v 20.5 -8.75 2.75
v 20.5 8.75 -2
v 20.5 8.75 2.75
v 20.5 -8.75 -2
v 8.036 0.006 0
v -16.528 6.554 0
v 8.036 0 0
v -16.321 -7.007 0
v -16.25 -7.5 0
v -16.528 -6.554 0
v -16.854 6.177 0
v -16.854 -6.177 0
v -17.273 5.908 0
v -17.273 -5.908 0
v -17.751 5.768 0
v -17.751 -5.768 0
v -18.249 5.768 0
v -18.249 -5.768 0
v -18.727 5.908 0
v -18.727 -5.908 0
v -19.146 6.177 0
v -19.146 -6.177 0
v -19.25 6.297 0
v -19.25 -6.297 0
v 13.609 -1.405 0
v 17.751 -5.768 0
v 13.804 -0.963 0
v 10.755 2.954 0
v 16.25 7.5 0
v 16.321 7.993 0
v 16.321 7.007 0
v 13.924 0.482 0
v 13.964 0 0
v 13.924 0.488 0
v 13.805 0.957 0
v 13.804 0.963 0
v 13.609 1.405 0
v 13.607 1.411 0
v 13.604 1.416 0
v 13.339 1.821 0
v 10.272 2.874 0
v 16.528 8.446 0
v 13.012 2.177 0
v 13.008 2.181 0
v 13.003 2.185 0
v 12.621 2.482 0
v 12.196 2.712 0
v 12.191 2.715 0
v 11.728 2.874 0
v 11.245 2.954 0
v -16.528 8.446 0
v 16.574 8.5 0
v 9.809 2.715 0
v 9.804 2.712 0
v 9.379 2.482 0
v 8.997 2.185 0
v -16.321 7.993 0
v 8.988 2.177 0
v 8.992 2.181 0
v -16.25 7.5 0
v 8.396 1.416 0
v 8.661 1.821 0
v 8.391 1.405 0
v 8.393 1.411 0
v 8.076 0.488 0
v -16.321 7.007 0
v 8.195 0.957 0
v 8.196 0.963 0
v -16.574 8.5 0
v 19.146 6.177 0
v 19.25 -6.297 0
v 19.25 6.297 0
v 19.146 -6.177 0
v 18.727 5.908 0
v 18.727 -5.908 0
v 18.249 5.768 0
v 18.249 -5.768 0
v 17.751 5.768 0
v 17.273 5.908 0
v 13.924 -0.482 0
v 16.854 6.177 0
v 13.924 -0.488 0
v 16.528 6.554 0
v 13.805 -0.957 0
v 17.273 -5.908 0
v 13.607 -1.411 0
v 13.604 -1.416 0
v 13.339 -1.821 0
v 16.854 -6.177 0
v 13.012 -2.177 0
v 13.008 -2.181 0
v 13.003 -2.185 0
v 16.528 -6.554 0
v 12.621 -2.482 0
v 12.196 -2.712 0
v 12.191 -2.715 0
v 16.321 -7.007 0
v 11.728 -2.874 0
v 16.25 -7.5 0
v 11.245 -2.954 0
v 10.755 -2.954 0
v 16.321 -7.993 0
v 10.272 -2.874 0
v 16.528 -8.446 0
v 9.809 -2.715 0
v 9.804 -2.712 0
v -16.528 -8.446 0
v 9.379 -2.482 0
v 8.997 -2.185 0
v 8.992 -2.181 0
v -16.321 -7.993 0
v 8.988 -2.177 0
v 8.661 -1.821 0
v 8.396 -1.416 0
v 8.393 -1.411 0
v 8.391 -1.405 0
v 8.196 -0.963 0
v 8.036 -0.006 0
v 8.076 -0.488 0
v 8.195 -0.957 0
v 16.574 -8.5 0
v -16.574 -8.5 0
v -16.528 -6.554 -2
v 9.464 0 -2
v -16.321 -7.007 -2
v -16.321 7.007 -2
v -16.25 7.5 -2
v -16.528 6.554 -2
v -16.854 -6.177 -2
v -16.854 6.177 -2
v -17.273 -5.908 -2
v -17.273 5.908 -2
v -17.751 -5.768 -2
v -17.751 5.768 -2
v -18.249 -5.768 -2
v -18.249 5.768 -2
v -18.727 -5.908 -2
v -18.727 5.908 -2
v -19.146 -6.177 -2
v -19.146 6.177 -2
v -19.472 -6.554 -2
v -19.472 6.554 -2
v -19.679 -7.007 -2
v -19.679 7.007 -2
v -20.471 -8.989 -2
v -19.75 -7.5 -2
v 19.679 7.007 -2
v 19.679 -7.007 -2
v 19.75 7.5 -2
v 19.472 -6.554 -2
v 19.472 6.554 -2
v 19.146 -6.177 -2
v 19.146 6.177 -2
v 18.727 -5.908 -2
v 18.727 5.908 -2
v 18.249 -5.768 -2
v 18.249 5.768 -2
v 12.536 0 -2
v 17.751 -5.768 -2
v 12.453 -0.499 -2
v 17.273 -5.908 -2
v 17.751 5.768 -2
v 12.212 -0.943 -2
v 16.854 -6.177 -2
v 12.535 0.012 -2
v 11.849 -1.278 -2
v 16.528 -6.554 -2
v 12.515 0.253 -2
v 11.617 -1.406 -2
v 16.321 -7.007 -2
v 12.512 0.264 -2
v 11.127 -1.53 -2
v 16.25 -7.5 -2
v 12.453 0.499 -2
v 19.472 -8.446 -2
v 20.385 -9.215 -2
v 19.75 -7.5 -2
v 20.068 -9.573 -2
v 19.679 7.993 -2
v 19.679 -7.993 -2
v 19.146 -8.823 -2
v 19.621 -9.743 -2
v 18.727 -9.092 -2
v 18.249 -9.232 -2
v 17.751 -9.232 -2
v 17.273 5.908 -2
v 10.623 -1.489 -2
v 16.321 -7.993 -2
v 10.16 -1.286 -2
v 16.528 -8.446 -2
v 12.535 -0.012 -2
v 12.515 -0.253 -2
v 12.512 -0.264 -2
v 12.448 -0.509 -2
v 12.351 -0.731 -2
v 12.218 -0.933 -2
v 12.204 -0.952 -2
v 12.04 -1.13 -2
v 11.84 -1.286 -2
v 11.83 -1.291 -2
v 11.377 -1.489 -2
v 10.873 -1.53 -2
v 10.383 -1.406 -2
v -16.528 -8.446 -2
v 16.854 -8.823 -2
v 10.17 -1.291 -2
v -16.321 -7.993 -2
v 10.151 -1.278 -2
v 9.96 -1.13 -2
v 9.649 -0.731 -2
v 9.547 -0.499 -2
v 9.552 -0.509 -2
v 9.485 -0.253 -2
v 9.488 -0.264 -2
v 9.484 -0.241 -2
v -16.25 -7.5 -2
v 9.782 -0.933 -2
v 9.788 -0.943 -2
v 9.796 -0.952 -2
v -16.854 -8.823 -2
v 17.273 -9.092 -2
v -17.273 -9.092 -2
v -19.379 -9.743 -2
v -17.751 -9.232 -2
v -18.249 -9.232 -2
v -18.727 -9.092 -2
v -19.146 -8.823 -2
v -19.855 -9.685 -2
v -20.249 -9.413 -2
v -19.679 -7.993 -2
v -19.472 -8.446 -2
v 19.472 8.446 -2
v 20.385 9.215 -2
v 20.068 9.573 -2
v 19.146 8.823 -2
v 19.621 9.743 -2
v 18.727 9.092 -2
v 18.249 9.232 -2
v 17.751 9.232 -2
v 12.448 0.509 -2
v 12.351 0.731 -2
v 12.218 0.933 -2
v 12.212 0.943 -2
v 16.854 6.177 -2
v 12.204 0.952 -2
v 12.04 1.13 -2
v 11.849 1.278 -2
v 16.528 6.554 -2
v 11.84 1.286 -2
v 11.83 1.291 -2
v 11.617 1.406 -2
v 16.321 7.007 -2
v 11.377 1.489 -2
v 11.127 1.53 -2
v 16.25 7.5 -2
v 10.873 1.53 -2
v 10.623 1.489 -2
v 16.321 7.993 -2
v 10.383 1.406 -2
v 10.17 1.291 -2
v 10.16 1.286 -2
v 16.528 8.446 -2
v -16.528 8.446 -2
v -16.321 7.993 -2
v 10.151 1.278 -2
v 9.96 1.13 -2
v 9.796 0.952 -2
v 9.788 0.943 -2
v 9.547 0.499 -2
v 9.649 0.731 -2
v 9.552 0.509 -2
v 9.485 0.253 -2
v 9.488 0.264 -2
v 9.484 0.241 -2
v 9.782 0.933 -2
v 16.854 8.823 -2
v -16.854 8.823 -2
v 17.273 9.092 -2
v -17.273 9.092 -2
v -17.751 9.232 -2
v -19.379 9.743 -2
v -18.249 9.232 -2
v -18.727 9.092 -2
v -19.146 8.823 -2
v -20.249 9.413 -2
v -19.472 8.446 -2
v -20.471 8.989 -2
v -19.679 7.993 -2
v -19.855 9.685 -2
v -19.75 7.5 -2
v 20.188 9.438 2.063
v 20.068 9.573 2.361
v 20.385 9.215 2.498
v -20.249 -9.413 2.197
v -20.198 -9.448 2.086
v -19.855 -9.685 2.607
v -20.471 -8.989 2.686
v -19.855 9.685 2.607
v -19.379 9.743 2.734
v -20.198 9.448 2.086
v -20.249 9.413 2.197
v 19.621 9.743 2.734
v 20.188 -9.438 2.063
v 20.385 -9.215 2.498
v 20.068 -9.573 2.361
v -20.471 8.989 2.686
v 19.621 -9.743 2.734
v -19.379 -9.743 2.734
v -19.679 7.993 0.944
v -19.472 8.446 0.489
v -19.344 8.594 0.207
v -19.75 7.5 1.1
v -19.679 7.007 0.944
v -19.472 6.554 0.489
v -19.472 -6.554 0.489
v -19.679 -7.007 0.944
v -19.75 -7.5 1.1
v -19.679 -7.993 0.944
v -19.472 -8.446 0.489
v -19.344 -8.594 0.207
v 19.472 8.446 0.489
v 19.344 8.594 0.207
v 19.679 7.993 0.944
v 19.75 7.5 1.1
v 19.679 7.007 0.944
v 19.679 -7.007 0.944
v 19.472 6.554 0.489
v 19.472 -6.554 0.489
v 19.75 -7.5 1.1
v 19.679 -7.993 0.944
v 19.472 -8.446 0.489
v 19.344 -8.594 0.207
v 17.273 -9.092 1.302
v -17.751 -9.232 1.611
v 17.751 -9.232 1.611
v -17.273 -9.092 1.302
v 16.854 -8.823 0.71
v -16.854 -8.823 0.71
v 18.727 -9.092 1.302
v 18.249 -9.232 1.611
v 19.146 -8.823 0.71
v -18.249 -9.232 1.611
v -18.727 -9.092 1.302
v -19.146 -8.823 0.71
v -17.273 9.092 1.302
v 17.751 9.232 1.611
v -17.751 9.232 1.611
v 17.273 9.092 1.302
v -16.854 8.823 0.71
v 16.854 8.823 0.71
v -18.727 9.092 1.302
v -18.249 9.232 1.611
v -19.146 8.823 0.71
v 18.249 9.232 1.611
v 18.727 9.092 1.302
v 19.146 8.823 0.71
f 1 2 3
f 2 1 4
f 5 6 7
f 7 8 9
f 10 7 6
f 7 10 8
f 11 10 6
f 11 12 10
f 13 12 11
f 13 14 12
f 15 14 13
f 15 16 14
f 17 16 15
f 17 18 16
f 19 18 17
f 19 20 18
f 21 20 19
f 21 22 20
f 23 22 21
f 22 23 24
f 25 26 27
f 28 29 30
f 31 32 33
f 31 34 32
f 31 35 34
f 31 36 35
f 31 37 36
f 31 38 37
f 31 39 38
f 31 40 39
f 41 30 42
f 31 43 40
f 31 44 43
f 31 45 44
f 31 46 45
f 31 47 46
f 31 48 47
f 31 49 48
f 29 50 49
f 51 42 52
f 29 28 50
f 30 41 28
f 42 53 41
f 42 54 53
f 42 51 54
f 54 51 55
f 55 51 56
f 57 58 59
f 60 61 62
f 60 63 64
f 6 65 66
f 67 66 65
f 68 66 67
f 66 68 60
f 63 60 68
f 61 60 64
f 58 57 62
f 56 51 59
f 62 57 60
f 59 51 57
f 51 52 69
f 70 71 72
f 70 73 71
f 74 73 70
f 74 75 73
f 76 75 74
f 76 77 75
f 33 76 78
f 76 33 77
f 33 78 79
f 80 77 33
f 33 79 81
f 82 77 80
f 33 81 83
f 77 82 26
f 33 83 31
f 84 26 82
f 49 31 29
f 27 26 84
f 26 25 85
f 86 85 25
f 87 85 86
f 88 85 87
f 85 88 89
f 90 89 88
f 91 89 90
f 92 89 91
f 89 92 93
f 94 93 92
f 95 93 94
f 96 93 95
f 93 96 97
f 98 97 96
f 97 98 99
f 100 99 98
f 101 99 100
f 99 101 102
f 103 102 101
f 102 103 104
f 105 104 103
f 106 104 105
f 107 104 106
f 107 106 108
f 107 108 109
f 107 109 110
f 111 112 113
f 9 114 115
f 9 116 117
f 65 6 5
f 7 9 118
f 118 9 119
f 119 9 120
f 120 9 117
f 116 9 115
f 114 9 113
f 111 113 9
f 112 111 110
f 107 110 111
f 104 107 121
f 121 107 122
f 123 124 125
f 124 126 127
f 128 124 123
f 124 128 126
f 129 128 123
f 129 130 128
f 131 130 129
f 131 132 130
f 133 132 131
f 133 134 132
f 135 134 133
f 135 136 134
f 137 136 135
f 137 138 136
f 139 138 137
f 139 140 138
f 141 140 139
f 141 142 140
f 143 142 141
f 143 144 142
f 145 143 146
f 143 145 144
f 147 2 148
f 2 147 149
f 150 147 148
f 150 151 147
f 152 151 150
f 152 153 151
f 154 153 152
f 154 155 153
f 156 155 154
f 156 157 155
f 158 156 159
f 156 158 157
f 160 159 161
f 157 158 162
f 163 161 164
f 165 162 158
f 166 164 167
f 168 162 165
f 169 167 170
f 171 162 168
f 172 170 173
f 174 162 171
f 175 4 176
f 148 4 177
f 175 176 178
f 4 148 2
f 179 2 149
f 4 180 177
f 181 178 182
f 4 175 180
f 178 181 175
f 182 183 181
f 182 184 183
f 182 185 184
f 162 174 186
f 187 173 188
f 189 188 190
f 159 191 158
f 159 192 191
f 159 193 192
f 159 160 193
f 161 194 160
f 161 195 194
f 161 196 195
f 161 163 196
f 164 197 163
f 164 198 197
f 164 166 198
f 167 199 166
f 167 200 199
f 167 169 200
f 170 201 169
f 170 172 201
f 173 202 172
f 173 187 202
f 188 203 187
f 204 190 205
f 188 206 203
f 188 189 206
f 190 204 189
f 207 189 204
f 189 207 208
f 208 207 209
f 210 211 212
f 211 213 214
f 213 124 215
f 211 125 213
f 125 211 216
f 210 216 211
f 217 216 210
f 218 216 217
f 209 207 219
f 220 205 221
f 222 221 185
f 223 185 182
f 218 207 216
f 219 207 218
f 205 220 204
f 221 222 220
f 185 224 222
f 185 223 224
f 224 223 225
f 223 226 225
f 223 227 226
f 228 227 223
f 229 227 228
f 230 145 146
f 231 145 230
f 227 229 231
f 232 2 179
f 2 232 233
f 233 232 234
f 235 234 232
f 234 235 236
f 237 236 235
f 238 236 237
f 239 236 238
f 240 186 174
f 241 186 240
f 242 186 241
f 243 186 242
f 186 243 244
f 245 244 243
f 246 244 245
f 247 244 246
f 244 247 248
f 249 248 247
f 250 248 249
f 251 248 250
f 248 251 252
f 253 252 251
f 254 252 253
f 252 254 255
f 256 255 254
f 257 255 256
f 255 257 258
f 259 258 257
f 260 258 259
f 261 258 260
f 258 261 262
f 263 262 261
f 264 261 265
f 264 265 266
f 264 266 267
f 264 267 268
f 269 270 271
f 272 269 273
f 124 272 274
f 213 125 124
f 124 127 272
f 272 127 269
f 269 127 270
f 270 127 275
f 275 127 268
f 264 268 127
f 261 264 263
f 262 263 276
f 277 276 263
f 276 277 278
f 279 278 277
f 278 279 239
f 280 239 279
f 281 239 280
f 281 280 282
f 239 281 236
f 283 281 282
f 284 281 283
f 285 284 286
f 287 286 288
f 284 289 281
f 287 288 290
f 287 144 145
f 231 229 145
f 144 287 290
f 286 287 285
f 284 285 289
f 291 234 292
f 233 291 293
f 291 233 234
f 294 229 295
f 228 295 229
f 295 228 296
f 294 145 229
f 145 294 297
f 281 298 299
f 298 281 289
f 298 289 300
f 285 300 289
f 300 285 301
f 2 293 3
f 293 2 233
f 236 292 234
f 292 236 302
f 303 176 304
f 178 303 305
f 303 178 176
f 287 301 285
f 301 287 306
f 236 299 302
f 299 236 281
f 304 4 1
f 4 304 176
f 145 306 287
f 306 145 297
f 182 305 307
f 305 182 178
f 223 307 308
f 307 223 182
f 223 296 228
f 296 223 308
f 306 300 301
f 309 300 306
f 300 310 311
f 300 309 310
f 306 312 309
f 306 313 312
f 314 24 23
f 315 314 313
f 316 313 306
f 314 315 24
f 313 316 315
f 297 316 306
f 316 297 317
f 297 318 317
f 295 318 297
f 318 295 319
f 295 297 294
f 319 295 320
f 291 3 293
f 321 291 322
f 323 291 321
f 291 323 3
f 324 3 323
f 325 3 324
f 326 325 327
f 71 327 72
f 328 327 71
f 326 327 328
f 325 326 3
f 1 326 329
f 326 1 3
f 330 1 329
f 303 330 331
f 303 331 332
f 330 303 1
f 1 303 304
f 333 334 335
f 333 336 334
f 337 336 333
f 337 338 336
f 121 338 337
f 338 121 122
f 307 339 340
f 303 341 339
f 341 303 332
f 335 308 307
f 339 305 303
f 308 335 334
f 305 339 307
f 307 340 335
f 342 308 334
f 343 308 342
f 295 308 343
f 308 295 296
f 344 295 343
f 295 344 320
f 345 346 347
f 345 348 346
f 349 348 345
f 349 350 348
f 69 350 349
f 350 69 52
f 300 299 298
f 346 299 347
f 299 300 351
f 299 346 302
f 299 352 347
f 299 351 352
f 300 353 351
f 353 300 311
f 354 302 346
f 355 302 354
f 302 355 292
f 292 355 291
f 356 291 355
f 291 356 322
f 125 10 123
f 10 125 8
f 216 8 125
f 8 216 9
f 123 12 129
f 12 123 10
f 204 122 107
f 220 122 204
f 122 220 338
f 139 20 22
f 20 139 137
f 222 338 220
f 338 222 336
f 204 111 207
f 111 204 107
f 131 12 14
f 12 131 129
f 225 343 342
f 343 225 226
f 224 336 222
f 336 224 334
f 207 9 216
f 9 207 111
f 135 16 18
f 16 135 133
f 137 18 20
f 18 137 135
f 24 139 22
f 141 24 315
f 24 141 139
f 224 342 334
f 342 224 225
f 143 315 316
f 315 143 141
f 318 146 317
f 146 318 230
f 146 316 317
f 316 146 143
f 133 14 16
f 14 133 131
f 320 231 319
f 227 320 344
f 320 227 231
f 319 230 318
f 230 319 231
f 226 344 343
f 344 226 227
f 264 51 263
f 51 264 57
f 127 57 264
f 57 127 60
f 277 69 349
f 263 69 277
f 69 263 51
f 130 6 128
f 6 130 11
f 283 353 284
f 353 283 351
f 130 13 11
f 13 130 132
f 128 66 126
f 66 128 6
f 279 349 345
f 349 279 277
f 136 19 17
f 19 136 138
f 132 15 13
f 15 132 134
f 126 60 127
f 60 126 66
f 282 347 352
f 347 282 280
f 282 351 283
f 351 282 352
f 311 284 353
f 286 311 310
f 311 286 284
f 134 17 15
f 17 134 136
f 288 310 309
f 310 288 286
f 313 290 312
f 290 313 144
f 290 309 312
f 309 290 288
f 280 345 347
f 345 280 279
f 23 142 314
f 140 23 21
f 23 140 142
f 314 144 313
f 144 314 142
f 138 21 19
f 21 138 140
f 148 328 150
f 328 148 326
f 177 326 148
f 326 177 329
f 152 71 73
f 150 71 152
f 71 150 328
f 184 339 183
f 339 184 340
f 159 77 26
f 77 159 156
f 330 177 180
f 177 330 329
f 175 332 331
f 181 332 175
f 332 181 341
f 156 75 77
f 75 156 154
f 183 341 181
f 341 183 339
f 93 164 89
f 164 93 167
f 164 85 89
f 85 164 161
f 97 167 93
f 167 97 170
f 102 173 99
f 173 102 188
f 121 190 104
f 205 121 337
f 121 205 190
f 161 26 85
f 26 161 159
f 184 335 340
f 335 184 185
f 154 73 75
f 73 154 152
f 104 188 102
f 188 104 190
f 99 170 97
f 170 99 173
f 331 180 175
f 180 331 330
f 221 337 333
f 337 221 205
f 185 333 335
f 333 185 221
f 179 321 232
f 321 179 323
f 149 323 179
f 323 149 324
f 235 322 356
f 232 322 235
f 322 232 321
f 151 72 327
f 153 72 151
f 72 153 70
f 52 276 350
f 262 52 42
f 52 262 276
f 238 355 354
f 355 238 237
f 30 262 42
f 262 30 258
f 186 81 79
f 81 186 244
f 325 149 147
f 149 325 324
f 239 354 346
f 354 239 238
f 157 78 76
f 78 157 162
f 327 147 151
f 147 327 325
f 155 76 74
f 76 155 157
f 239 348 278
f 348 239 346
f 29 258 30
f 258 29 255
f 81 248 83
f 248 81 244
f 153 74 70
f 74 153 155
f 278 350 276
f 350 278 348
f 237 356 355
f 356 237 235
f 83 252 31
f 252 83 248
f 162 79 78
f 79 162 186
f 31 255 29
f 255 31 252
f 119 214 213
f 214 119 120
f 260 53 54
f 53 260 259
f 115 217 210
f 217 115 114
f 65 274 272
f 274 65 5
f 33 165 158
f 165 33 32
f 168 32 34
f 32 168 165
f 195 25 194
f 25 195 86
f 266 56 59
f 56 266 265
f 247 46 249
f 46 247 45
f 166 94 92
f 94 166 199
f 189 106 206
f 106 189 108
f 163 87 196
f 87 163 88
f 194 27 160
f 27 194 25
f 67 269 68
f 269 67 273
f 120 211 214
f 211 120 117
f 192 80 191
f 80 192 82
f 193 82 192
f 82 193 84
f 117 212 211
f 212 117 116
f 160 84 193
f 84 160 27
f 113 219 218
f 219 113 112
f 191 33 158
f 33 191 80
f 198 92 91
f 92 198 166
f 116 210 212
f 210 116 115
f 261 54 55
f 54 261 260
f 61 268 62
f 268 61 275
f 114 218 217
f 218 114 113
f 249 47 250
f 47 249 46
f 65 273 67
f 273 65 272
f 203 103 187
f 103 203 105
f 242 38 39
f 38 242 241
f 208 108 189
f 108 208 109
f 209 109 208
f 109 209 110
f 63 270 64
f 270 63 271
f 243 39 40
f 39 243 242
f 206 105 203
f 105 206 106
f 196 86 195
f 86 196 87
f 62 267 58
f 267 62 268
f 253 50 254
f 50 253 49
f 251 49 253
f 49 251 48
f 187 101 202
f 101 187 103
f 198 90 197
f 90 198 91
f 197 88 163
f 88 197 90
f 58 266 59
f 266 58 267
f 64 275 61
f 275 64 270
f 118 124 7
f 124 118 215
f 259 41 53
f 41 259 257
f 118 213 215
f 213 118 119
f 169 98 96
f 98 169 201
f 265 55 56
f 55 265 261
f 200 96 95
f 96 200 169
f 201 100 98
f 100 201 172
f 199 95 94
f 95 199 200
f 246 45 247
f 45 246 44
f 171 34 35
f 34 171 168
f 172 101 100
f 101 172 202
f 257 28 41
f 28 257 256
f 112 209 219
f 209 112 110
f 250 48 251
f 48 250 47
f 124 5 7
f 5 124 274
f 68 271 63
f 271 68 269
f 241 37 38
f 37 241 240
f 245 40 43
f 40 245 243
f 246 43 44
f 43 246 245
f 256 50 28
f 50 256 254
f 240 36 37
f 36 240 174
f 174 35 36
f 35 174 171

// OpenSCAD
// file: ../lib/bearing.scad
/*
 * Bearing model.
 *
 * Originally by Hans Häggström, 2010.
 * Modified by Frédéric Mantegazza (2015)
 *
 * Dual licenced under Creative Commons Attribution-Share Alike 3.0 and LGPL2 or later
 */

EPSILON = 0.01;


BEARING_INNER_DIAMETER = 0;
BEARING_OUTER_DIAMETER = 1;
BEARING_WIDTH = 2;


// Bearing dimensions
// model == XXX ? [inner dia, outer dia, width]:
function bearingDimensions(model) =
    model ==  623 ? [ 3, 10, 4]:
    model ==  624 ? [ 4, 13, 5]:
    model ==  684 ? [ 5, 11, 5]:  // or [4, 9, 4]: ???
	model == "MR105" ? [5, 10, 3]:
	model == "MR115" ? [5, 11, 4]:
    model ==  695 ? [ 5, 13, 4]:
    model ==  605 ? [ 5, 14, 5]:
    model ==  625 ? [ 5, 16, 5]:
	model ==  106 ? [ 6, 10, 3]:
	model ==  126 ? [ 6, 12, 4]:
	model ==  696 ? [6, 15, 5]:
	model ==  626 ? [6, 19, 6]:
    model ==  627 ? [ 7, 22, 7]:
    model ==  688 ? [ 8, 16, 4]:
    model ==  698 ? [ 8, 19, 6]:
    model ==  608 ? [ 8, 22, 7]:
    model == 6700 ? [10, 16, 4]:
    model == 6800 ? [10, 19, 5]:
    model == 6900 ? [10, 22, 6]:
    model == 6701 ? [12, 18, 4]:
    model == 6801 ? [12, 21, 5]:
    model == 6901 ? [12, 24, 6]:
    model == 6702 ? [15, 21, 4]:
    model == 6703 ? [17, 23, 4]:
    [8, 22, 7]; // this is the default


function bearing_d(model) = bearingDimensions(model)[BEARING_INNER_DIAMETER];
function bearing_D(model) = bearingDimensions(model)[BEARING_OUTER_DIAMETER];
function bearing_w(model) = bearingDimensions(model)[BEARING_WIDTH];


module _bearing(d, D, w, pos, rot) {

	module ring(D, d, w) {
		difference() {
			cylinder(r=D/2, h=w, $fs=0.1);
			translate([0,0,-EPSILON]) {
				cylinder(r=d/2, h=w+2*EPSILON, $fs=0.1);
			}
		}
	}

	inner_rim = d + (D - d) * 0.25;
	outer_rim = D - (D - d) * 0.25;
	mid_sink = w * 0.1;

    translate(pos) rotate(rot) {
        difference() {
            ring(D, d, w);
            translate([0, 0, -EPSILON]) {
                ring(outer_rim, inner_rim, mid_sink+EPSILON);
            }
            translate([0, 0, w-mid_sink]) {
                ring(outer_rim, inner_rim, mid_sink+EPSILON);
            }
        }
    }
}


module bearing(model, pos=[0,0,0], rot=[0,0,0]) {
	d = bearing_d(model);
	D = bearing_D(model);
	w = bearing_w(model);
	color([0.5, 0.5, 0.5]) {
		_bearing(d, D, w, pos, rot);
	}
}


bearing(model=608, pos=[10, 10, 10], rot=[0, 90, 45]);
// file: ../lib/rounded_cube.scad
// Cube with rounded edges on all sides
// The first parameters defines the size of the cube (array)
// The second parameter defines the edges radius along each axis (array)
//
// Thanks to hagen from OpenSCAD mailing list for this optimize solution

//rcube(size=[25, 25, 10], radius=[1, 1, 5], center=true, $fn=32);


module _rsquare(size=[1, 1], radius=0) {
    assign(sx=size[0], sy=size[1], r=min(radius, size[0]/2, size[1]/2)) {
        if (r == 0) {
            square(size=[sx, sy], center=true);  // not rounded
        }
        else {
            hull() {
                for (corner=[[sx/2-r, sy/2-r], [-sx/2+r, sy/2-r], [sx/2-r, -sy/2+r], [-sx/2+r, -sy/2+r]]) {
                    translate(corner) {
                        circle(r=r);
                    }
                }
            }
        }
    }
}


module _rcube(size=[1, 1, 1], radius=[0, 0, 0]) {
    assign(sx=size[0], sy=size[1], sz=size[2], rx=radius[0], ry=radius[1], rz=radius[2]) {
        translate([sx/2, sy/2, sz/2]) {
            intersection() {
                rotate([90, 0, 0]) {
                    rotate([0, 90, 0]) {
                        linear_extrude(height=sx, center=true) {
                            _rsquare(size=[sy, sz], radius=rx);
                        }
                    }
                }
                rotate([90, 0, 0]) linear_extrude(height=sy, center=true) {
                    _rsquare(size=[sx, sz], radius=ry);
                }
                linear_extrude(height=sz, center=true) {
                    _rsquare(size=[sx, sy], radius=rz);
                }
            }
        }
    }
}


module rcube(size=[1, 1, 1], radius=[0, 0, 0], center=true) {
    if (!center) {
        _rcube(size=size, radius=radius);
    }
    else {
        assign(sx=size[0], sy=size[1], sz=size[2]) {
            translate([-sx/2, -sy/2, -sz/2]) {
                _rcube(size, radius=radius);
            }
        }
    }
}


//module rcube(size=[1, 1, 1], radius=[0, 0, 0], center=true) {
//    assign(sx=size[0], sy=size[1], sz=size[2], rx=radius[0], ry=radius[1], rz=radius[2]) {
//        intersection() {
//
//            // Radius on X axis
//            rotate([0, 90, 0])
//            linear_extrude(height=sx, center=center) {
//                minkowski() {
//                    square([sz-2*rx, sy-2*rx], center=center);
//                    scale([rx, rx]) circle(1);
//                }
//            }
//
//            // Radius on Y axis
//            rotate([90, 0, 0])
//            linear_extrude(height=sy, center=center) {
//                minkowski() {
//                    square([sx-2*ry, sz-2*ry], center=center);
//                    scale([ry, ry]) circle(1);
//                }
//            }
//
//            // Radius on Z axis
//            linear_extrude(height=sz, center=center) {
//                minkowski() {
//                    square([sx-2*rz, sy-2*rz], center=center);
//                    scale([rz, rz]) circle(1);
//                }
//            }
//        }
//    }
//}
// main file
use <../lib/rounded_cube.scad>
use <../lib/bearing.scad>

SERVO_L = 41.0;
SERVO_W = 19.5;

CHAMFER_W = 1.25;
CHAMFER_H = 2.75;

BOTTOM_T = 2.0;

SCREWS_X = 36.0;
SCREWS_Y = 15.0;
SCREWS_HEAD_D = 3.5;

SHAFT_POS_X = 19.0 / 2;

$fs=0.5;
$fa=2.5;


module chamfer(w=1, h=1, l=10, center=true)
{
    rotate([90, 0, 0]) {
        linear_extrude(height=l, center=center) {
            polygon(points=[[0, 0], [w, 0], [0, h]]);
        }
    }
}


module lid()
{
    difference() {
        union() {
            
            // bottom
            translate([0, 0, -BOTTOM_T/2]) {
                rcube([SERVO_L, SERVO_W, BOTTOM_T], [0, 0, 1], center=true);
            }

            // chanfrein
            intersection() {
                translate([0, 0, CHAMFER_H/2]) {
                    rcube([SERVO_L, SERVO_W, CHAMFER_H], [0, 0, 1], center=true);
                }
                union() {
                    translate([-SERVO_L/2, 0, 0]) {
                        chamfer(w=CHAMFER_W, h=CHAMFER_H, l=SERVO_W, center=true);
                    }
                    translate([SERVO_L/2, 0, 0]) {
                        mirror([1, 0, 0]) {
                            chamfer(w=CHAMFER_W, h=CHAMFER_H, l=SERVO_W, center=true);
                        }
                    }
                    translate([0, -SERVO_W/2, 0]) {
                        rotate([0, 0, 90]) {
                            chamfer(w=CHAMFER_W, h=CHAMFER_H, l=SERVO_L, center=true);
                        }
                    }
                    translate([0, SERVO_W/2, 0]) {
                        rotate([0, 0, -90]) {
                            chamfer(w=CHAMFER_W, h=CHAMFER_H, l=SERVO_L, center=true);
                        }
                    }
                }
            }
        }
        
        // screws holes
        for (x=[-SCREWS_X/2, SCREWS_X/2]) {
            for (y=[-SCREWS_Y/2, SCREWS_Y/2]) {
                translate([x, y, -BOTTOM_T-0.05]) {
                    cylinder(d=SCREWS_HEAD_D, h=BOTTOM_T+CHAMFER_H+0.1, center=false);
                }
            }
        }
        
        // screw bearing hole
        translate([SERVO_L/2-SHAFT_POS_X, 0, -BOTTOM_T-0.05]) {
            difference() {
                cylinder(d1=3, d2=6, h=BOTTOM_T+0.1, center=false);
            }
        }
    }
}


module vitamins()
{
    translate([SERVO_L/2-SHAFT_POS_X, 0, 0]) {
    }
}


lid();
%vitamins();
